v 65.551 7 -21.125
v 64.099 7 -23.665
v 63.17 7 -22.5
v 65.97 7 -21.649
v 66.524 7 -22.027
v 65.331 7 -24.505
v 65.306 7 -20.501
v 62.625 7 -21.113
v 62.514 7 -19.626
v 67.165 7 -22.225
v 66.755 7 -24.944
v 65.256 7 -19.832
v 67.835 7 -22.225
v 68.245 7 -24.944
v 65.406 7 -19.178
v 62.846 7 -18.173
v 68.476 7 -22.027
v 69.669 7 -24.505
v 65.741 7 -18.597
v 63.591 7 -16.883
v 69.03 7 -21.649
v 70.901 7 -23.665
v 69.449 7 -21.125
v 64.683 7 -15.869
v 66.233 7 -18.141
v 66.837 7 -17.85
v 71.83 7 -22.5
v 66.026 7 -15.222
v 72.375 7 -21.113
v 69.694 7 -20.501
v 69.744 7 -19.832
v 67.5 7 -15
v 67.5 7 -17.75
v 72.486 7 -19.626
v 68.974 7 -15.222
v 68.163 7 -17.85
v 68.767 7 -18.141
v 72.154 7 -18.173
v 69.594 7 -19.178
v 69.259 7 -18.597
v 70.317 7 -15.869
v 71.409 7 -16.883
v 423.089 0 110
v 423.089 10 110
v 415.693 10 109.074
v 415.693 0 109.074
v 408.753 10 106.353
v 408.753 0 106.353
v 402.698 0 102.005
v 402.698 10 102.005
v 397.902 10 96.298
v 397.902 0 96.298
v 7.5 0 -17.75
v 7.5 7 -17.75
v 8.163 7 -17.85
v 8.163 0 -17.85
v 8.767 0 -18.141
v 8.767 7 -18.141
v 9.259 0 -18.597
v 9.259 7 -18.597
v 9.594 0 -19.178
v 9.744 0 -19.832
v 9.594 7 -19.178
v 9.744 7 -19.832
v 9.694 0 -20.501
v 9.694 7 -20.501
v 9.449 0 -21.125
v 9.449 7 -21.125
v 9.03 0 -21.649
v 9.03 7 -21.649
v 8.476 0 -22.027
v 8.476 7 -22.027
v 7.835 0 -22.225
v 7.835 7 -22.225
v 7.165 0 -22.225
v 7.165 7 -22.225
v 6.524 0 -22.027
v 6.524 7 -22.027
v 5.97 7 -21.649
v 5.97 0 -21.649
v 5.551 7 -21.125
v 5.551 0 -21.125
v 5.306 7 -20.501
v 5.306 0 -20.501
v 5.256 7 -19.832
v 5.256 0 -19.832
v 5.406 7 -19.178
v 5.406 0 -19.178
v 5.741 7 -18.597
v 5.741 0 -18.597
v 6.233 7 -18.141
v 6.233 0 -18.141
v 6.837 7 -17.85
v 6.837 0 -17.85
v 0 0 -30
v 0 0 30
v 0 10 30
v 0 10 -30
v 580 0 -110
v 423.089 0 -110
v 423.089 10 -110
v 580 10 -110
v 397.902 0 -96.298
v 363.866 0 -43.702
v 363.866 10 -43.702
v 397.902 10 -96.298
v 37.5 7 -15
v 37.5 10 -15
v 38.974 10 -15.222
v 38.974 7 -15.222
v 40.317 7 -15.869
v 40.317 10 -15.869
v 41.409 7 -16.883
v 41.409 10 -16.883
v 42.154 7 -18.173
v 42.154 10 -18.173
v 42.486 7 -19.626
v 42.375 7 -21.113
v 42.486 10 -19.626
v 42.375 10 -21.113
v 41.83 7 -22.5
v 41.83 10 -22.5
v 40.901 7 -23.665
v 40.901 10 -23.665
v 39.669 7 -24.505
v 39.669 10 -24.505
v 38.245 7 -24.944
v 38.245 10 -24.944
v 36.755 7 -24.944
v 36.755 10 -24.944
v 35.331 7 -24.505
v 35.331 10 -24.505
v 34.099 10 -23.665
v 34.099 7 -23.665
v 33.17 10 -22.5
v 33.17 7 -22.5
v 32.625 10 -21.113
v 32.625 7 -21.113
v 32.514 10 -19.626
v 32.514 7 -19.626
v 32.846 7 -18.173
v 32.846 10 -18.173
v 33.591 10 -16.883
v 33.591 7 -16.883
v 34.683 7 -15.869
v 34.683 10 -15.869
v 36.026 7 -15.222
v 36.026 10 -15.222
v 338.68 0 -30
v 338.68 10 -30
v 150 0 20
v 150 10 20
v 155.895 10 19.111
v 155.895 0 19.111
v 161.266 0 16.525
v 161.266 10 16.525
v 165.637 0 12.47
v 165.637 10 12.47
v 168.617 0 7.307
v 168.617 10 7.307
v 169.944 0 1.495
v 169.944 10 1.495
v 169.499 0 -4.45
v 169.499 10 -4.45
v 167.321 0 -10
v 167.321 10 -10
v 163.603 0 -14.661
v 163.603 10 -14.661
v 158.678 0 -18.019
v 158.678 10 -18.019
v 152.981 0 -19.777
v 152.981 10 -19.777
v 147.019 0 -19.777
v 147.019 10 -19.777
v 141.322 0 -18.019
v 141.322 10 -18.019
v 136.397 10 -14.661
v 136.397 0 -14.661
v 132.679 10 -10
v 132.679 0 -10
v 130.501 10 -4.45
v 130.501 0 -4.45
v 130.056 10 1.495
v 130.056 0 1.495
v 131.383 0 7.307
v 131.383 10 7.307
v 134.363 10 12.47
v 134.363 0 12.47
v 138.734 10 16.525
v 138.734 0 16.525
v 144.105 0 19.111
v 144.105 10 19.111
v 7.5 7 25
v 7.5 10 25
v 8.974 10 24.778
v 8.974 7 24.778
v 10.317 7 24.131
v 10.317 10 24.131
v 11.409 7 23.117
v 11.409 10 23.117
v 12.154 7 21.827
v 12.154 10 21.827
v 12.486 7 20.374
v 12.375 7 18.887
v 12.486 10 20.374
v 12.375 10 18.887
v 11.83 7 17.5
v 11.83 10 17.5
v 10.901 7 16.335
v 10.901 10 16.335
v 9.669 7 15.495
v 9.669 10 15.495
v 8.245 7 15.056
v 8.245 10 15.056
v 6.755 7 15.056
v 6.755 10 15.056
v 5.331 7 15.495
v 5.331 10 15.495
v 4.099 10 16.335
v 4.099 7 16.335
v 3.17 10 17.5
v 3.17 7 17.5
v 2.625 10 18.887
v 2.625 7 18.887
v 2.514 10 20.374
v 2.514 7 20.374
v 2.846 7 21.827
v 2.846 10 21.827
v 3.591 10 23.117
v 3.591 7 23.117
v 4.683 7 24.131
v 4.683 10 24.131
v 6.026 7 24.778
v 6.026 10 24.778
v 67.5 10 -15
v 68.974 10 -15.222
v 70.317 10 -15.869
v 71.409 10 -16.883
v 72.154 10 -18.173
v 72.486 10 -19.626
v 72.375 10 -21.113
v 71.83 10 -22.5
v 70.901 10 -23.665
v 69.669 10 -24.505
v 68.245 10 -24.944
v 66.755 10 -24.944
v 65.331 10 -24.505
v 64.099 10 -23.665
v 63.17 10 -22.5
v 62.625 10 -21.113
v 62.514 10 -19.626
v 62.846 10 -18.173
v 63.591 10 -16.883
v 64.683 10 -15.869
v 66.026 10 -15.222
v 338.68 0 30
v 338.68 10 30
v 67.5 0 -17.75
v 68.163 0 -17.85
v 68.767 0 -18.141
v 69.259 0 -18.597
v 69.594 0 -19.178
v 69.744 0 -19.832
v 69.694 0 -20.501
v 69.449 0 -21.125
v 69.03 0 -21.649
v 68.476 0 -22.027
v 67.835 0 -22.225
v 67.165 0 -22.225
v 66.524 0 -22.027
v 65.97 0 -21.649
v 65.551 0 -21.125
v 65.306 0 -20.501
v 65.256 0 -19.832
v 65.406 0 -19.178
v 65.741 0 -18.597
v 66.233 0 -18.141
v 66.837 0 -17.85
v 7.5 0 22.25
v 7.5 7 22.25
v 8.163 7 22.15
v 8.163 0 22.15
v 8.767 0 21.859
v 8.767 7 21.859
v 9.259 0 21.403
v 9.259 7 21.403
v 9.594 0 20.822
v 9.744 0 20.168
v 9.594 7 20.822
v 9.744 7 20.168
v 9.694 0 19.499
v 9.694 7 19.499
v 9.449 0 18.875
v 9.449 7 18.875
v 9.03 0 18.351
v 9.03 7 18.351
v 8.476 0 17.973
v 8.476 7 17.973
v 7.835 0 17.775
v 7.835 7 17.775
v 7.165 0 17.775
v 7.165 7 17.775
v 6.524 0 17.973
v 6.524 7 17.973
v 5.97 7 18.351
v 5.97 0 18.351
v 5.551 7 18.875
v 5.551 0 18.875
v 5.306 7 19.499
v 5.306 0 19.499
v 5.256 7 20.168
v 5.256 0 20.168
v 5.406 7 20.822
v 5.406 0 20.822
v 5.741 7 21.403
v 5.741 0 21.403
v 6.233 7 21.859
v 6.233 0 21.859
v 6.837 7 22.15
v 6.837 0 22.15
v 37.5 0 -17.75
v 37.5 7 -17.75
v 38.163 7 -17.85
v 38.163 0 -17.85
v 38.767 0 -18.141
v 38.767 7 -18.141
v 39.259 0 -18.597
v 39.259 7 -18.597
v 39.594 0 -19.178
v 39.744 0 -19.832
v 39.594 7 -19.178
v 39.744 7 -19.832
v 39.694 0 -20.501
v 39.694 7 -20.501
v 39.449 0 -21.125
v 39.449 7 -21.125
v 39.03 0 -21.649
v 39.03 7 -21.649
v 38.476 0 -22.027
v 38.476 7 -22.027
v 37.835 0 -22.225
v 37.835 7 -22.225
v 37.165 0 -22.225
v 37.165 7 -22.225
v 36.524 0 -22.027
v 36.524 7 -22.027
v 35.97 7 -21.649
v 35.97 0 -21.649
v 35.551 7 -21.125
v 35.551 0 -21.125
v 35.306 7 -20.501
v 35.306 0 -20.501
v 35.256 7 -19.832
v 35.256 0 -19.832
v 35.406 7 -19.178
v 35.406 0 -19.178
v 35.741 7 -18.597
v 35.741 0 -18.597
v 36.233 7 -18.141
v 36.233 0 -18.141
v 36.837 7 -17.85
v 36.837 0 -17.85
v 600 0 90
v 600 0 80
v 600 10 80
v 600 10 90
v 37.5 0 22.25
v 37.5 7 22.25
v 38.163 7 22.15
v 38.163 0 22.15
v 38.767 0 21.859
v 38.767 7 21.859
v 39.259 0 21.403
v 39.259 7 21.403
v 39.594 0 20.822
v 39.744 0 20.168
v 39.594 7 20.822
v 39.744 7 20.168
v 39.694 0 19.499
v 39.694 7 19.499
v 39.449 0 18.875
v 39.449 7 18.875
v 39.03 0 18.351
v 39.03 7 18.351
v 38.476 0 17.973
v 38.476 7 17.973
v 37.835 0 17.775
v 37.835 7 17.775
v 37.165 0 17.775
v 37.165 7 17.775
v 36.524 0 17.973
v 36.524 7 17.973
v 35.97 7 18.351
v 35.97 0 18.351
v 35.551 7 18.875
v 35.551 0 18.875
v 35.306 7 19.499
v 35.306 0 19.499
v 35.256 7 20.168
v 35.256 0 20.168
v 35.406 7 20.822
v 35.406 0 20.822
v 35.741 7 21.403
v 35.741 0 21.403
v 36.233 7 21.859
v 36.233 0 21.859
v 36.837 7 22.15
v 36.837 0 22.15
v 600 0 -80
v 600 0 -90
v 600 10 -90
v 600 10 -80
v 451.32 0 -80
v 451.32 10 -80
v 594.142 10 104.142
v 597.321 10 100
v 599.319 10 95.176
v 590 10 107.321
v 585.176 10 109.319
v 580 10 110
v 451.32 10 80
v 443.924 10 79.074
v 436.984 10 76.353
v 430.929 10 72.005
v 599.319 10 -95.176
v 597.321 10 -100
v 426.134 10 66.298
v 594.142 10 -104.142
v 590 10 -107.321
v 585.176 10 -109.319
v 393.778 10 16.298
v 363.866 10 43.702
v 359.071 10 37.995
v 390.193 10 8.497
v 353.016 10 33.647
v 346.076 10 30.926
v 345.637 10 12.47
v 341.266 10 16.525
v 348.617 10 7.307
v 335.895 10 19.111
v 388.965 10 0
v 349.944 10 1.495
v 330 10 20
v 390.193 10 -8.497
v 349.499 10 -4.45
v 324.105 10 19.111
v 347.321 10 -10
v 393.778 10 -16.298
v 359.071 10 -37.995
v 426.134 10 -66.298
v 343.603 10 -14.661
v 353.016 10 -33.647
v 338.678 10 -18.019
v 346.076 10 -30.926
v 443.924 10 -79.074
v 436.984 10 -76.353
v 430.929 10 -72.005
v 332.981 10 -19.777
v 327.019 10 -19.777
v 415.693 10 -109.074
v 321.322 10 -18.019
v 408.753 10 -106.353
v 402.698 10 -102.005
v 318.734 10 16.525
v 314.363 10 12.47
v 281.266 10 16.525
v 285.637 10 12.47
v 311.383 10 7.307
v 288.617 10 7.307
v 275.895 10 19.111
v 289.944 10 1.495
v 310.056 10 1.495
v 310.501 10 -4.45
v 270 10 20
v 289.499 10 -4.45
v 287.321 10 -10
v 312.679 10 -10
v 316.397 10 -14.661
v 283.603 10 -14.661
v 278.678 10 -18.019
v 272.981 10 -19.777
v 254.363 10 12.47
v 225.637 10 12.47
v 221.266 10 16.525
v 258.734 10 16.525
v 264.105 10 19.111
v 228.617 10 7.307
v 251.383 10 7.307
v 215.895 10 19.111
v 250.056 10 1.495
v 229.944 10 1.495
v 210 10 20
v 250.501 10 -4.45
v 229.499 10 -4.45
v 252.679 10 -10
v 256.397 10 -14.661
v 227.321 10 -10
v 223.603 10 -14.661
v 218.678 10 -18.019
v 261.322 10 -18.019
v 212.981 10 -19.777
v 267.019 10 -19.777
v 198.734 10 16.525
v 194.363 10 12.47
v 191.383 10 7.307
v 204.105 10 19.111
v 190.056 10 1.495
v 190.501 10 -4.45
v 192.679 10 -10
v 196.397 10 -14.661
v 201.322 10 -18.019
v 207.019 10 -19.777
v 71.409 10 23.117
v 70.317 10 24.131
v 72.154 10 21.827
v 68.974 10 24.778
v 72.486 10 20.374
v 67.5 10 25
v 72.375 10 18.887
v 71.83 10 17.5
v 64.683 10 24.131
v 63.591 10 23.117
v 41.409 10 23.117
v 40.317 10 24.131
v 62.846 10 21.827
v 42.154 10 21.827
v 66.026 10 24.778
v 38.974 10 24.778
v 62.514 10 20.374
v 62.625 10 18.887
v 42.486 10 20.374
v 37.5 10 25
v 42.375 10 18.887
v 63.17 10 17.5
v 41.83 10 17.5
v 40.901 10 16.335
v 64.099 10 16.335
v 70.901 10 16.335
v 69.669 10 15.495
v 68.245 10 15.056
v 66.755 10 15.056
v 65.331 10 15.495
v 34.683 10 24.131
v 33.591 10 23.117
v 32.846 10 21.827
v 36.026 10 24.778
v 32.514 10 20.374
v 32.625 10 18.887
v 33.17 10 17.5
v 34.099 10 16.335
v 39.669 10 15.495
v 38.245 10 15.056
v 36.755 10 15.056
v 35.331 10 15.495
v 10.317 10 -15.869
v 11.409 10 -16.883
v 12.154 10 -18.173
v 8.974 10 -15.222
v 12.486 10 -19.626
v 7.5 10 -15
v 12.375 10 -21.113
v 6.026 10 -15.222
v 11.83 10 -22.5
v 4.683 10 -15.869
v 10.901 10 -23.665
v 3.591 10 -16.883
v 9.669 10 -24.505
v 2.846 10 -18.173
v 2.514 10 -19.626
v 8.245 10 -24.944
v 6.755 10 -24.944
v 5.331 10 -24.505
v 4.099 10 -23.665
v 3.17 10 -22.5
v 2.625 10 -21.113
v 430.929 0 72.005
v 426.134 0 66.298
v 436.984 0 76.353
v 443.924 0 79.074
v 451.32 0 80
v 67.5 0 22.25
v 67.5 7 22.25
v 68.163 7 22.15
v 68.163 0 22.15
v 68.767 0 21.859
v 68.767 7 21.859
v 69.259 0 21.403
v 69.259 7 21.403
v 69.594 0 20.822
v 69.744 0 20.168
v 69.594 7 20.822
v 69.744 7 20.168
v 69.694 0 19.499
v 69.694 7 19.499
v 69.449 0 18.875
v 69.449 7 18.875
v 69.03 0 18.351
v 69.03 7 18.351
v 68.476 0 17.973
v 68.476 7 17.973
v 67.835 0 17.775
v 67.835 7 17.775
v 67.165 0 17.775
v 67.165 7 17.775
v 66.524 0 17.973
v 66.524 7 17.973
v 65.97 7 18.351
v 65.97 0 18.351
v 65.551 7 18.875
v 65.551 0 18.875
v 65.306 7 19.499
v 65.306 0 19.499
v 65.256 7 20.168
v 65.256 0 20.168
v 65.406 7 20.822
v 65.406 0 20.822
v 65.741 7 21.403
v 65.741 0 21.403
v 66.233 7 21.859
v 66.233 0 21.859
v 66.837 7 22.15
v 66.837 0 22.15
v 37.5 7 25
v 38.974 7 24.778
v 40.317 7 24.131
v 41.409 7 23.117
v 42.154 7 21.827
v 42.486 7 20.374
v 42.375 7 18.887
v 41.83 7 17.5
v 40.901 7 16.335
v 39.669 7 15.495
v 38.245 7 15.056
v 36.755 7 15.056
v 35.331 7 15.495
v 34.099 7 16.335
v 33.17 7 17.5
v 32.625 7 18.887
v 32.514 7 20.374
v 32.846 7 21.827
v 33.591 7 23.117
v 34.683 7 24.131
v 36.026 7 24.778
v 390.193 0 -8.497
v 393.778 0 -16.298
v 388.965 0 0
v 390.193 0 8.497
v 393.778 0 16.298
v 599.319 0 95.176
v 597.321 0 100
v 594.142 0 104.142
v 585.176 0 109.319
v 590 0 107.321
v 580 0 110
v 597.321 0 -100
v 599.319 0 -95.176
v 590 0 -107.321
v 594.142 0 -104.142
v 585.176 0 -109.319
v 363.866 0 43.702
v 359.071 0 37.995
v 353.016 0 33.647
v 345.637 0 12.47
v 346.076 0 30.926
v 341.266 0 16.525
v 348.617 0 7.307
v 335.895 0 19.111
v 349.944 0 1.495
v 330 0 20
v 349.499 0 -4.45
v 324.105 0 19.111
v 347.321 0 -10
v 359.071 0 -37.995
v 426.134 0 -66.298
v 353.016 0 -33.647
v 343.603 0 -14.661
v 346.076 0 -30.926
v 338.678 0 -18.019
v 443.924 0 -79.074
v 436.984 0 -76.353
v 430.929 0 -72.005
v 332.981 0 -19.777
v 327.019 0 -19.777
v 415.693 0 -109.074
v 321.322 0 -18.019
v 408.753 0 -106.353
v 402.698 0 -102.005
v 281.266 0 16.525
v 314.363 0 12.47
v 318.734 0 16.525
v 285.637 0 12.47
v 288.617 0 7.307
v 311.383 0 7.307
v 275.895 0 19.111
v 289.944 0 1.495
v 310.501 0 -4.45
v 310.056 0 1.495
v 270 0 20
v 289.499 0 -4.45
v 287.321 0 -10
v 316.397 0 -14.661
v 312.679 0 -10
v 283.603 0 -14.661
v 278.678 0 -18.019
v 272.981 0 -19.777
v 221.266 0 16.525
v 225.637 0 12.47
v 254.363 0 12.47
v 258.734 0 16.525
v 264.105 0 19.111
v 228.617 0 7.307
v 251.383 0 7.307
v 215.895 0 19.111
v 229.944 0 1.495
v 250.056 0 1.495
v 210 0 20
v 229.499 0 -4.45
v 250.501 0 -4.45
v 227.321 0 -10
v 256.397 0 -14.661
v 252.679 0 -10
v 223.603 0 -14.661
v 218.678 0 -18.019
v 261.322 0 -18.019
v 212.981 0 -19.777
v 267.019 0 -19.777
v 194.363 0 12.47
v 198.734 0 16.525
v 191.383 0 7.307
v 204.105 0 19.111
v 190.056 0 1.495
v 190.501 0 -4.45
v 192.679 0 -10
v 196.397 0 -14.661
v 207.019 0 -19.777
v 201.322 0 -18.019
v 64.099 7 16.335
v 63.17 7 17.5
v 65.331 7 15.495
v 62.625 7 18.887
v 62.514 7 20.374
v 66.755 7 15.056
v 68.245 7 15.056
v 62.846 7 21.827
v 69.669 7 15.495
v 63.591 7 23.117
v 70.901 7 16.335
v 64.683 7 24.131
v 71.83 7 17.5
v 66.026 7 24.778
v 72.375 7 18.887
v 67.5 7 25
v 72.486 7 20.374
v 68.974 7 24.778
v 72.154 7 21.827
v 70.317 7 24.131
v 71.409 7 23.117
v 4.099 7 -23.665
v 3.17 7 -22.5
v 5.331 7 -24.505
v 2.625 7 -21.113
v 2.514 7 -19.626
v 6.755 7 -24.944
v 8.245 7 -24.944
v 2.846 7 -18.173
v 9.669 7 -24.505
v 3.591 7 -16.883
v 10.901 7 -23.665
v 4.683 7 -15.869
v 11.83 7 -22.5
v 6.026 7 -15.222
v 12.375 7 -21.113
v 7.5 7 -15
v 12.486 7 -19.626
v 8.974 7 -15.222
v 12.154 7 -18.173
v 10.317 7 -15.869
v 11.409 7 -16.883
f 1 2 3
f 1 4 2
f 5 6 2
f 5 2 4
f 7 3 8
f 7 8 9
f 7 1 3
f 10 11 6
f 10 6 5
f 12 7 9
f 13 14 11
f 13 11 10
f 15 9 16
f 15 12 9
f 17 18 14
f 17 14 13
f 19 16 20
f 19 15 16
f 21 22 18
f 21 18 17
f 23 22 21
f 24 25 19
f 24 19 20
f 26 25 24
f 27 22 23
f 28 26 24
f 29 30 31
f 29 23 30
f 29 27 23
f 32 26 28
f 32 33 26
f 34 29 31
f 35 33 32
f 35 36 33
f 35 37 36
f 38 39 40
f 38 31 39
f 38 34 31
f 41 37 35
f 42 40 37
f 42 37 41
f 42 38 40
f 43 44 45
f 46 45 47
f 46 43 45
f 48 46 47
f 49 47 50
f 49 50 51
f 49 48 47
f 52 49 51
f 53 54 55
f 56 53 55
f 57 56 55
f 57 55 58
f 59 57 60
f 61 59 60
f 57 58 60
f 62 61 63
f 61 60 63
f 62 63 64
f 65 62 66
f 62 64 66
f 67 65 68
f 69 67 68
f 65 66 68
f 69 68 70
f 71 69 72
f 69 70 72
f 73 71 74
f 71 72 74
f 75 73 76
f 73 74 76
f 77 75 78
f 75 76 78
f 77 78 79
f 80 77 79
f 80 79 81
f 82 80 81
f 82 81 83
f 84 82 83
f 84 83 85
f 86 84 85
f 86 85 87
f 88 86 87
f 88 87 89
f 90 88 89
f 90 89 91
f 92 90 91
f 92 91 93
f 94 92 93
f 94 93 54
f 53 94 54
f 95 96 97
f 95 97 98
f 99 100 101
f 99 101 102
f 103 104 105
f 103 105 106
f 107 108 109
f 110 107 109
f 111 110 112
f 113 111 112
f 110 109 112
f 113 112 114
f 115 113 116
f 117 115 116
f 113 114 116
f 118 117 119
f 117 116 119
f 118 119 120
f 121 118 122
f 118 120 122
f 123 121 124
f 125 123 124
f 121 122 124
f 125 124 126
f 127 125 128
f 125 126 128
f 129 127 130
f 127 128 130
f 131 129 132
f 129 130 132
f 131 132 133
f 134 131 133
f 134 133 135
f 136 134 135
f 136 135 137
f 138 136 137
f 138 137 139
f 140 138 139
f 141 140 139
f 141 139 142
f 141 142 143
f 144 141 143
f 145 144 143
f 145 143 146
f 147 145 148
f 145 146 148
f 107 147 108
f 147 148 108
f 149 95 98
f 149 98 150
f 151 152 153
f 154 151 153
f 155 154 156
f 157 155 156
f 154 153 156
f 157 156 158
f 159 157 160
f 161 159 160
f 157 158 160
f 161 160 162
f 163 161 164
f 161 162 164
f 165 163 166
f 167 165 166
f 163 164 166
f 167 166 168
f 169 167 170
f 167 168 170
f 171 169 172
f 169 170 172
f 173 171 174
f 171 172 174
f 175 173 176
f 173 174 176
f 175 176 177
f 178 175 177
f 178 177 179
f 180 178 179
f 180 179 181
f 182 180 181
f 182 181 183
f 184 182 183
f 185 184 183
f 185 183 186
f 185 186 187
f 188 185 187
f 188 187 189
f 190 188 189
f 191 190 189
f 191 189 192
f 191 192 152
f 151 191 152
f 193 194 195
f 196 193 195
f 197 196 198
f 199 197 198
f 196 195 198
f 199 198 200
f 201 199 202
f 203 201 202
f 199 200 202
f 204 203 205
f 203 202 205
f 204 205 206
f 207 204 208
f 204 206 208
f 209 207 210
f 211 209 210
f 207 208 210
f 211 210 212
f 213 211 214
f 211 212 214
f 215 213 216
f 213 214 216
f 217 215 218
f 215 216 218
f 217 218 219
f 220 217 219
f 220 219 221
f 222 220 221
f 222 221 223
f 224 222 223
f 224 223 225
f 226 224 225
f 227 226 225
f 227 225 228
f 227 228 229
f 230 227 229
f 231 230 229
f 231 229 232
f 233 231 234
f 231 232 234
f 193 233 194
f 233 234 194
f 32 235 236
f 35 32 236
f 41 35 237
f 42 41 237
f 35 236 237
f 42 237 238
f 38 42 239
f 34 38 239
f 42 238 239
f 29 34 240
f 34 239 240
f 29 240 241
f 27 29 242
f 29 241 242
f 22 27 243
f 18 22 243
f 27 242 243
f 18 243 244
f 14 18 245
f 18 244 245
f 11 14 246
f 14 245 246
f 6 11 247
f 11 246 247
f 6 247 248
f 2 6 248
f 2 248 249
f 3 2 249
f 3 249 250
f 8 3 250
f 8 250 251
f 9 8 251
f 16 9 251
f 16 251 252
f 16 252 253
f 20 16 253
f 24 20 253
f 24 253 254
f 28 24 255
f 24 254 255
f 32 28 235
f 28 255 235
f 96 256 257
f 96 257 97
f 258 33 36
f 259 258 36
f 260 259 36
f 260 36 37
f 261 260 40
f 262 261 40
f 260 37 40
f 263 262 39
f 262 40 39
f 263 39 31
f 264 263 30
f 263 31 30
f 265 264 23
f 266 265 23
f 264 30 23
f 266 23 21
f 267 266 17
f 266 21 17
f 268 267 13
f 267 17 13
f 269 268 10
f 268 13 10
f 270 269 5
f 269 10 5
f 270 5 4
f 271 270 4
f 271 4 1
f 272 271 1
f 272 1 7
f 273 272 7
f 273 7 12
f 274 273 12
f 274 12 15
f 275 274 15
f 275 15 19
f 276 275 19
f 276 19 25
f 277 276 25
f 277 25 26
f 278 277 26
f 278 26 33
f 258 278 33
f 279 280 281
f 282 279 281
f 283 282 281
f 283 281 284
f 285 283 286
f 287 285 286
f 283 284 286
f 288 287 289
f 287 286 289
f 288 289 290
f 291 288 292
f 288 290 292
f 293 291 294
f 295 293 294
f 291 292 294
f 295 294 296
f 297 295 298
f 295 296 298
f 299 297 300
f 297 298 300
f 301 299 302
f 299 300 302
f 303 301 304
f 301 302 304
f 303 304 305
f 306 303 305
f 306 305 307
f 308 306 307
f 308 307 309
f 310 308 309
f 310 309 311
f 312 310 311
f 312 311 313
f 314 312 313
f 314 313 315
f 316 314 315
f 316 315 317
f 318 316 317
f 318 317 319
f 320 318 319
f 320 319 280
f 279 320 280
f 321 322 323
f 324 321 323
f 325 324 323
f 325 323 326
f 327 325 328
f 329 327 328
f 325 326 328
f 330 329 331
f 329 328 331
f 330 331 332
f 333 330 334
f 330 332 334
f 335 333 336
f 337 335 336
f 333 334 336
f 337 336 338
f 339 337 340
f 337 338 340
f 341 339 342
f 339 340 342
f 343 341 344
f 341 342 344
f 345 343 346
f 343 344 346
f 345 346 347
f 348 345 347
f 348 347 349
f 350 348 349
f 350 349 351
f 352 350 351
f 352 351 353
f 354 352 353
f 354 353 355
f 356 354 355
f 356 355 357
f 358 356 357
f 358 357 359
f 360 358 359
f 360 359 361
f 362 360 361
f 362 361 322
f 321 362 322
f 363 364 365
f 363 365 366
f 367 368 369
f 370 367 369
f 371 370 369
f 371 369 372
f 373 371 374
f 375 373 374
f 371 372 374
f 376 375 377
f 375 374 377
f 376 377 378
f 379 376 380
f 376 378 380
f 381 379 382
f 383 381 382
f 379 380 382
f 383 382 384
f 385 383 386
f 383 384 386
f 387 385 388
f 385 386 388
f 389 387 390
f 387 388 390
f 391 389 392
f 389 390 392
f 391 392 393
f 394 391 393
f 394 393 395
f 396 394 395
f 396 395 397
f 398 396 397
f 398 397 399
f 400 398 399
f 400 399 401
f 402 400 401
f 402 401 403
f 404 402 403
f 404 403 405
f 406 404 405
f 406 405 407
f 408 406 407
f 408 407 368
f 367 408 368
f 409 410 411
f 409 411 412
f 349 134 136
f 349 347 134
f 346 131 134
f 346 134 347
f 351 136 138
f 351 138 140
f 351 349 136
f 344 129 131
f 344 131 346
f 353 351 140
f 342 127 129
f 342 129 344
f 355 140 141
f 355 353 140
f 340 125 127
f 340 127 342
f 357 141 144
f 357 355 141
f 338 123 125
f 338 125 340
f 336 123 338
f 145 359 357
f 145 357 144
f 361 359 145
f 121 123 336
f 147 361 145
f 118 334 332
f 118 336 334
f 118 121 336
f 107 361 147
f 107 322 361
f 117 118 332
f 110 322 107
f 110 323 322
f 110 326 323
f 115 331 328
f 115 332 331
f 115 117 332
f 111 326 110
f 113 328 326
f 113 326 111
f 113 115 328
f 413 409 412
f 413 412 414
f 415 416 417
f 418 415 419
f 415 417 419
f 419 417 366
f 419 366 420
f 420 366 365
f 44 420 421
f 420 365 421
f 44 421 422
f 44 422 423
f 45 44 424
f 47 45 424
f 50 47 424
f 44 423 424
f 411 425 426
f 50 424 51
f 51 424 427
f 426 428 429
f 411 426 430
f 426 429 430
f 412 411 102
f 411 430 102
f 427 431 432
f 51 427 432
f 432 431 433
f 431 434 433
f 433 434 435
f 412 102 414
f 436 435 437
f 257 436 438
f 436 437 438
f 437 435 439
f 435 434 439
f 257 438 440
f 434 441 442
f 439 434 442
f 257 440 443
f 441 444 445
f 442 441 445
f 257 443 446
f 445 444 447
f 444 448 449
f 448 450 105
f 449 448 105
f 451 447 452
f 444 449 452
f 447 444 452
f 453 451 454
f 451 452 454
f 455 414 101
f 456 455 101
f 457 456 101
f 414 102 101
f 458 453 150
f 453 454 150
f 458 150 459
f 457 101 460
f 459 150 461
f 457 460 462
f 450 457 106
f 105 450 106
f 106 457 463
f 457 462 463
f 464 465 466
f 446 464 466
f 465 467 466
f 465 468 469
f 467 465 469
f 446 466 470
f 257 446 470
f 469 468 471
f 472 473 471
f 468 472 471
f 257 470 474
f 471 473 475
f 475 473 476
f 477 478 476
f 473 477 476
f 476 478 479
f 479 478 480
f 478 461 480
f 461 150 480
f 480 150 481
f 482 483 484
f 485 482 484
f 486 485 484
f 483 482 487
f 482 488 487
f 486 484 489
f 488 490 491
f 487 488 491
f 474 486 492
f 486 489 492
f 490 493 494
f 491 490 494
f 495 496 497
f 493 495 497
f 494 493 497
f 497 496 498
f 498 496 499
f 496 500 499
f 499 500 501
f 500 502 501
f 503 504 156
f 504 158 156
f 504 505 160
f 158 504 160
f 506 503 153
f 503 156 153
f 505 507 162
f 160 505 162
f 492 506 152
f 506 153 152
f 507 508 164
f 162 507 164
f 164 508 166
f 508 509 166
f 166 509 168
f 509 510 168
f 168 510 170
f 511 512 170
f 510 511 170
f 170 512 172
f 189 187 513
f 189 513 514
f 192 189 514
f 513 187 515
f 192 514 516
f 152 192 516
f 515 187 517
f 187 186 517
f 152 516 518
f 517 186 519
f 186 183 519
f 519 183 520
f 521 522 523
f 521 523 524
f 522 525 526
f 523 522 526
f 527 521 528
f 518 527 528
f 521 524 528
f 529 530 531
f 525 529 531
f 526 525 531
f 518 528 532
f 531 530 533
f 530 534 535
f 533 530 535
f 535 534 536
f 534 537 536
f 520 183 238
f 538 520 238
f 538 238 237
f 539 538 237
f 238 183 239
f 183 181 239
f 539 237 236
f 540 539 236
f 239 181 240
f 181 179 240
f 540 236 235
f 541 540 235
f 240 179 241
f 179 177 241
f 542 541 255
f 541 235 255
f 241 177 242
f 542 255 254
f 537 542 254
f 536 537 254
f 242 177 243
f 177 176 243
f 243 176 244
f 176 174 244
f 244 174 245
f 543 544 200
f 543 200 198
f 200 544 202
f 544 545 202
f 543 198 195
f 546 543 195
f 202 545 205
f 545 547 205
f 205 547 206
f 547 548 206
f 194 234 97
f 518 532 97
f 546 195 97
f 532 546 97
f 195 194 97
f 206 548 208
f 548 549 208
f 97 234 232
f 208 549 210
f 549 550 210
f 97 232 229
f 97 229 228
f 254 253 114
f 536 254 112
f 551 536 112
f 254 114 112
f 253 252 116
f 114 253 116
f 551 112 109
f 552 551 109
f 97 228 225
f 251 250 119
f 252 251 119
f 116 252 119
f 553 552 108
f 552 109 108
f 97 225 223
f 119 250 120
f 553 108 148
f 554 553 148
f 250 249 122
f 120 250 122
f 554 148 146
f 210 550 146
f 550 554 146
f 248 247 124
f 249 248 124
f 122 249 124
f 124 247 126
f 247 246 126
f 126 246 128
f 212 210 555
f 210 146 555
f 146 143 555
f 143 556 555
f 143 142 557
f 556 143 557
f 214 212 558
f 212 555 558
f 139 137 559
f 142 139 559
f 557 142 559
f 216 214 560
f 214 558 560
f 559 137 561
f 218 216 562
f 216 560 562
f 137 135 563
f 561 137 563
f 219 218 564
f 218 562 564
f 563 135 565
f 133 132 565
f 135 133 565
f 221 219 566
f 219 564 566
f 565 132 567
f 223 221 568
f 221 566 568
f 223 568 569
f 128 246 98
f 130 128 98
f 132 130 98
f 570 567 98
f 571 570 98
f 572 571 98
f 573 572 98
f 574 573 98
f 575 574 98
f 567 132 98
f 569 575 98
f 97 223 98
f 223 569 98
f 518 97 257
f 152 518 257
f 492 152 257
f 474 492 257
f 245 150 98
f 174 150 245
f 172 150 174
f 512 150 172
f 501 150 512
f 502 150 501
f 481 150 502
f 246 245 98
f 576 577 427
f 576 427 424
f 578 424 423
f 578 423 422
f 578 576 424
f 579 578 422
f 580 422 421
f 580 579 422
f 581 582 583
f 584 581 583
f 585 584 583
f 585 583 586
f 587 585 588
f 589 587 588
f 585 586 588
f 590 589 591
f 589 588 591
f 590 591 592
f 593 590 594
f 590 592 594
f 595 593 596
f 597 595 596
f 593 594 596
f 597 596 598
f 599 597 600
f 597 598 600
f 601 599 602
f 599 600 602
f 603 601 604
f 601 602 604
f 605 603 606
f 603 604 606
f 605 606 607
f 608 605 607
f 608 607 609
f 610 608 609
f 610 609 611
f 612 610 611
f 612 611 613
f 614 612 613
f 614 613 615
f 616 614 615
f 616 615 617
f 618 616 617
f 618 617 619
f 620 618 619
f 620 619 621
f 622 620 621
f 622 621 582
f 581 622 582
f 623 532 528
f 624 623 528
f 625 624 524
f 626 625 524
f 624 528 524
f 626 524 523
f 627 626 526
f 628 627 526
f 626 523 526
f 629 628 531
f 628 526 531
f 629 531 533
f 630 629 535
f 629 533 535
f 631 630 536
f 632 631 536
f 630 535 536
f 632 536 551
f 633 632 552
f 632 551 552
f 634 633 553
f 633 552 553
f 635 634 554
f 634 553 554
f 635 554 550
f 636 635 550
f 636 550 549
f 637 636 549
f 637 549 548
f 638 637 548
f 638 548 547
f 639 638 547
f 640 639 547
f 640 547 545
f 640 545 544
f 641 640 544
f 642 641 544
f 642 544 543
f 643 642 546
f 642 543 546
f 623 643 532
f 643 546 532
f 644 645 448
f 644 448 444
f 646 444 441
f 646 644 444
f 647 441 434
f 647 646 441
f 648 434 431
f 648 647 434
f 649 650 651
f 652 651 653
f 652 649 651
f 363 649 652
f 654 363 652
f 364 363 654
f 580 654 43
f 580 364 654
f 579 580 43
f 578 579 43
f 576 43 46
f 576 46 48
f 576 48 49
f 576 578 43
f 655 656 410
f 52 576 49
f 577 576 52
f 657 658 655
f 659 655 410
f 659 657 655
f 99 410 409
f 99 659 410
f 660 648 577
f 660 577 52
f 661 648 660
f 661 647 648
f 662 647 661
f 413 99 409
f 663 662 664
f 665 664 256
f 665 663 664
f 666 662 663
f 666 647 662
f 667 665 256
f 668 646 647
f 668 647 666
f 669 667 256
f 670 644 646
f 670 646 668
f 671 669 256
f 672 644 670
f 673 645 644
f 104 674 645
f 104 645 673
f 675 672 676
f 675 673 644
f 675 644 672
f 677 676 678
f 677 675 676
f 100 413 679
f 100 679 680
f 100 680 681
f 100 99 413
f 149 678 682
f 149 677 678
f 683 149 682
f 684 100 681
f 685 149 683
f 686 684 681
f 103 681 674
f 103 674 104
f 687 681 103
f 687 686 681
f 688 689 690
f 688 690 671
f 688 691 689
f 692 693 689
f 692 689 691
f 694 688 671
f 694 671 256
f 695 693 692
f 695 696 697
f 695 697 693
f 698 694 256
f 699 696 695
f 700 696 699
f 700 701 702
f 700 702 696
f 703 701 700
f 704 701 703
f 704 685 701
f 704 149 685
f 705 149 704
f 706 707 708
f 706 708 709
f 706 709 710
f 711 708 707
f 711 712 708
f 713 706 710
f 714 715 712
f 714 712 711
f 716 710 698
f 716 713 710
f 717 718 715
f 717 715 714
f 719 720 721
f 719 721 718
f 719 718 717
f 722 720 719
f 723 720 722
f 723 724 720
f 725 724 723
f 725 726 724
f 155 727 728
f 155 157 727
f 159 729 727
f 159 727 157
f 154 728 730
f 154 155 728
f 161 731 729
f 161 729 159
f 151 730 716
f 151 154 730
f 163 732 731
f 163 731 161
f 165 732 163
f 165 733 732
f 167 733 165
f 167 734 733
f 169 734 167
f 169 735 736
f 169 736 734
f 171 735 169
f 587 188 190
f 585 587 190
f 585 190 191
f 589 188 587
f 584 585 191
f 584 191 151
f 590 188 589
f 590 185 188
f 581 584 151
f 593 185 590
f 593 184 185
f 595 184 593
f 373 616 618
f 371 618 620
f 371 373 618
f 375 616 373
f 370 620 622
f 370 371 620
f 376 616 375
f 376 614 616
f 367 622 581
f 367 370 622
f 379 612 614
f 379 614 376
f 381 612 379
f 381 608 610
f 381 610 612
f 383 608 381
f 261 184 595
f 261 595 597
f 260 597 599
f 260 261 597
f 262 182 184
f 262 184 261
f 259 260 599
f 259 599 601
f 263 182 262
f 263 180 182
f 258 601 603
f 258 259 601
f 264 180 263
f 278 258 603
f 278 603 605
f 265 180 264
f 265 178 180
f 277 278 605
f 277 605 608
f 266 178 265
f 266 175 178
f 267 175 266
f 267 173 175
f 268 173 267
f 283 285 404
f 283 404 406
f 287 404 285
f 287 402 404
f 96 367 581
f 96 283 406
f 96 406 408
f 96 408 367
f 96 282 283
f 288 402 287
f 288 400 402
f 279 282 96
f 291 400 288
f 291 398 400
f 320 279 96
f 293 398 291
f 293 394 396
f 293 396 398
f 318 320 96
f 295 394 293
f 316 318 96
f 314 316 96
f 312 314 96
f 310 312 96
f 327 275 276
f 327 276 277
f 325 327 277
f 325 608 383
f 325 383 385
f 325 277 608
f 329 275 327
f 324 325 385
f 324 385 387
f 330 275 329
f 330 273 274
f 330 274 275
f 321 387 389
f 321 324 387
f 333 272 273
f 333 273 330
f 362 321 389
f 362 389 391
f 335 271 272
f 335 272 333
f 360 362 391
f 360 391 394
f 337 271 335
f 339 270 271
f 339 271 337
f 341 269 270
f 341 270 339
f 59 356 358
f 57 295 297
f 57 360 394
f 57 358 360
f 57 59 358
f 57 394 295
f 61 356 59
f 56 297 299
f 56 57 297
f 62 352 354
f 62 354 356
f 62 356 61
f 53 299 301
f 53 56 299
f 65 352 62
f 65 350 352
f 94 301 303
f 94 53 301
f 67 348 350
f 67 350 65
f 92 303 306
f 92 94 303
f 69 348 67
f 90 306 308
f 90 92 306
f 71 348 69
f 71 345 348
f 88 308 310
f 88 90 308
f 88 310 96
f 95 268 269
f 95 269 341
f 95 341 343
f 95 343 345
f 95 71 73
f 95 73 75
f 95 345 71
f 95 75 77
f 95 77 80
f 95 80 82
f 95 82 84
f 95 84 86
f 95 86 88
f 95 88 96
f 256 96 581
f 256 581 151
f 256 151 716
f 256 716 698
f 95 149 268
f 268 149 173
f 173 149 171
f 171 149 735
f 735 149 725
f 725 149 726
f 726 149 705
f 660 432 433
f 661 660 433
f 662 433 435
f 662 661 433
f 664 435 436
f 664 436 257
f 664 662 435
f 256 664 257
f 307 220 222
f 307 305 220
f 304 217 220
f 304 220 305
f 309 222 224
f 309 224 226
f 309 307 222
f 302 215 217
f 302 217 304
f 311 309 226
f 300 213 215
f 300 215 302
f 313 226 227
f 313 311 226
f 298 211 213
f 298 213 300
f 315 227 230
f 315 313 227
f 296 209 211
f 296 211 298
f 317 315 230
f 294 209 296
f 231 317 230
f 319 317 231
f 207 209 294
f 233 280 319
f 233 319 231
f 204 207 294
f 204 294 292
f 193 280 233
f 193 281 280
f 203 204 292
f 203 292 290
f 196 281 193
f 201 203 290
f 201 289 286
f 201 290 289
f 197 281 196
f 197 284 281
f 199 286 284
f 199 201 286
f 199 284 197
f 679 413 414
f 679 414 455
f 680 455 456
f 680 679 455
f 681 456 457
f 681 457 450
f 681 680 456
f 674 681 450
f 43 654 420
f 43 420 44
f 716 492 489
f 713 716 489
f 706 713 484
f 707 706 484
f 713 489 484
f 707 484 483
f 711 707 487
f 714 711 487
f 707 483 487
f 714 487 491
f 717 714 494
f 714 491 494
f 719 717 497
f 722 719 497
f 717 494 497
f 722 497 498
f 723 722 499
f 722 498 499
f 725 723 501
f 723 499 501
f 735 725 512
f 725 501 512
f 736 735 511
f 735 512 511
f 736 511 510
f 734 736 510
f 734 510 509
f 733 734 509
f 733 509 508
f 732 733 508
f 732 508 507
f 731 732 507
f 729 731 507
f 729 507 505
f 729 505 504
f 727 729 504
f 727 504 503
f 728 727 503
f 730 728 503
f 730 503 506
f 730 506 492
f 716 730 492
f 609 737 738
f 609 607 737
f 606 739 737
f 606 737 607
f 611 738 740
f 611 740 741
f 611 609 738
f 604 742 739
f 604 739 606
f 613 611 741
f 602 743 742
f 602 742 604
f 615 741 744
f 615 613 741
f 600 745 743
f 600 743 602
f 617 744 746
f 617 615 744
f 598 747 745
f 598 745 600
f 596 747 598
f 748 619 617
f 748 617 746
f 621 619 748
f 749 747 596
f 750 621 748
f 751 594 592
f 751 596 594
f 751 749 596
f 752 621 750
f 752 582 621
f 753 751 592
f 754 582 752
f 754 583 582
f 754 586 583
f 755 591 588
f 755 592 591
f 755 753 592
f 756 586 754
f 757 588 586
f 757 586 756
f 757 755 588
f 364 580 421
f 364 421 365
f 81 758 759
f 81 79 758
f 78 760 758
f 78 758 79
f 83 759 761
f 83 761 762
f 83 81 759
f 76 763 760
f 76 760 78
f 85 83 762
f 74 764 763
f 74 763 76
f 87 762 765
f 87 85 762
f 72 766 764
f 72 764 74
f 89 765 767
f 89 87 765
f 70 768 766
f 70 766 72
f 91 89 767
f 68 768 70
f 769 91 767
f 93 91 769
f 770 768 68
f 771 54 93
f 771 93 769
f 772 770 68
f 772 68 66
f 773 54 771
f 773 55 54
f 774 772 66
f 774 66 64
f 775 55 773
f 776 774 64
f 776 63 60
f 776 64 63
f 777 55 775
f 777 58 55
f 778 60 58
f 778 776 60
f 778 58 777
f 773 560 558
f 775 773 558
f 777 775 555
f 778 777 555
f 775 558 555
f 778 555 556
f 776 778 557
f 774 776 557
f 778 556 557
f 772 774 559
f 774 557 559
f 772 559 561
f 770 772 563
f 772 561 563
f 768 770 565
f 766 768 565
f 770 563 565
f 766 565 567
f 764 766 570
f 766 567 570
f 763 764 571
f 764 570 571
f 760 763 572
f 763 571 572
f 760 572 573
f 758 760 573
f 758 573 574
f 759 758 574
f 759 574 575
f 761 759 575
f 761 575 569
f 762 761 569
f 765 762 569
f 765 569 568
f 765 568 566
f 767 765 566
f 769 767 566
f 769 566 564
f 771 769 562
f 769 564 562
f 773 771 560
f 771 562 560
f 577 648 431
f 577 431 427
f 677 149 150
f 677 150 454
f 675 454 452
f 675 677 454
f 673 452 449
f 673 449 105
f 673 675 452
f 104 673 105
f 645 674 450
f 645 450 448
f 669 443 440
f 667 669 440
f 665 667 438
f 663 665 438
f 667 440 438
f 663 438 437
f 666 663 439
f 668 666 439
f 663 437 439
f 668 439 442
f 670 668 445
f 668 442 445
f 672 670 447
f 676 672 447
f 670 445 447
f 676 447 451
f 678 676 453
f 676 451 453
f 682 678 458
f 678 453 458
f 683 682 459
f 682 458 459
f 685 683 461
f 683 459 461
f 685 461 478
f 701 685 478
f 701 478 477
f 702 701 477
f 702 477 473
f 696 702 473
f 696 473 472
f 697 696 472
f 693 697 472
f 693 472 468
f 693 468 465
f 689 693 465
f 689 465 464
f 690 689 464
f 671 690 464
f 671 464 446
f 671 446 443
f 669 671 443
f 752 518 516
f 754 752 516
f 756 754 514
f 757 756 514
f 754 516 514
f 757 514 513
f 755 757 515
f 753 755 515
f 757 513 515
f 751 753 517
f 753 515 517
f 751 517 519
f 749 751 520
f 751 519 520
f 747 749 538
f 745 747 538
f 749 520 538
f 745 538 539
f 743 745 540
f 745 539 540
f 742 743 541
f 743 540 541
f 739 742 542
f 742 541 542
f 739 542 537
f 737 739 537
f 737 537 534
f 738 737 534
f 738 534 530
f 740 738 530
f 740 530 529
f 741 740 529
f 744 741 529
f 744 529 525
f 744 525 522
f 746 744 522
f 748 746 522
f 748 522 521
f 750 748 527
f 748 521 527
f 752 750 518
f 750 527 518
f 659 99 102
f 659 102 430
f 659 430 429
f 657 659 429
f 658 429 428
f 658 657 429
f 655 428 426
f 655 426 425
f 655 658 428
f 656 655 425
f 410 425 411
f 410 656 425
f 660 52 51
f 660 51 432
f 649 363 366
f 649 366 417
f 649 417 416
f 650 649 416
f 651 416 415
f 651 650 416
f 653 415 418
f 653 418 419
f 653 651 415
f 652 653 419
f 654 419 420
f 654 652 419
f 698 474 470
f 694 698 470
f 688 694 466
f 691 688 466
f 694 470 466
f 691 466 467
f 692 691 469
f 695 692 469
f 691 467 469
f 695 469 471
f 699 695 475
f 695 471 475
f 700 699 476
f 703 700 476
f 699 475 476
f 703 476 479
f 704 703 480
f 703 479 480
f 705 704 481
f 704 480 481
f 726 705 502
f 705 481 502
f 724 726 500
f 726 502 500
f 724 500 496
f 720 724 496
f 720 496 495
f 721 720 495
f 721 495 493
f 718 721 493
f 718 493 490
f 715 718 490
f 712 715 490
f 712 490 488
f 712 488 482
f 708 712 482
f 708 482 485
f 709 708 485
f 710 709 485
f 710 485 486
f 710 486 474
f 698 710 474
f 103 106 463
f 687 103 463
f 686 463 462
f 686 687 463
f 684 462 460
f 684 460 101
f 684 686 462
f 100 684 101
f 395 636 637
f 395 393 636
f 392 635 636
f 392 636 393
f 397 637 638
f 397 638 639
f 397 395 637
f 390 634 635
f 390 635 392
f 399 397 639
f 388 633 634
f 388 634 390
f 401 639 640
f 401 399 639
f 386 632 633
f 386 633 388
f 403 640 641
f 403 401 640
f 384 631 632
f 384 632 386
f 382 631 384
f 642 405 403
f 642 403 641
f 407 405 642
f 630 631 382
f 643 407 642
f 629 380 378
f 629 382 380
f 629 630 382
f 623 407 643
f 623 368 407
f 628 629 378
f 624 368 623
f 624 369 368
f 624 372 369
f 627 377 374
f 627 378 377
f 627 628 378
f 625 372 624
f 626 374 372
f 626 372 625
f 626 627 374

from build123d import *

# Parameters (mm, degrees)
EXTRUDE_1_DEPTH     = 10
SKETCH_3_R          = 20
CUT_EXTRUDE_1_DEPTH = 611.081961707
SKETCH_4_R          = 5
CUT_EXTRUDE_2_DEPTH = 3
SKETCH_5_R          = 2.25
CUT_EXTRUDE_3_DEPTH = 611.040162612


with BuildPart() as part:
    # 스케치1 → 보스-돌출1 (new body)
    with BuildSketch(Plane(origin=(0, 0, 0), x_dir=(1, 0, 0), z_dir=(0, 1, 0))):
        with BuildLine():
            Line((363.866410807, 43.701562934), (397.902344915, 96.298437066))
            ThreePointArc((397.902344915, 96.298437066), (408.752779214, 106.352923101), (423.088868082, 110))
            Line((423.088868082, 110), (580, 110))
            ThreePointArc((580, 110), (594.142135624, 104.142135624), (600, 90))
            Line((600, 90), (600, 80))
            Line((600, 80), (451.32011236, 80))
            ThreePointArc((451.32011236, 80), (436.984023492, 76.352923101), (426.133589193, 66.298437066))
            Line((426.133589193, 66.298437066), (393.778116867, 16.298437066))
            ThreePointArc((393.778116867, 16.298437066), (388.964640033, 0), (393.778116867, -16.298437066))
            Line((393.778116867, -16.298437066), (426.133589193, -66.298437066))
            ThreePointArc((426.133589193, -66.298437066), (436.984023492, -76.352923101), (451.32011236, -80))
            Line((451.32011236, -80), (600, -80))
            Line((600, -80), (600, -90))
            ThreePointArc((600, -90), (594.142135624, -104.142135624), (580, -110))
            Line((580, -110), (423.088868082, -110))
            ThreePointArc((423.088868082, -110), (408.752779214, -106.352923101), (397.902344915, -96.298437066))
            Line((397.902344915, -96.298437066), (363.866410807, -43.701562934))
            ThreePointArc((363.866410807, -43.701562934), (353.015976508, -33.647076899), (338.67988764, -30))
            Line((338.67988764, -30), (0, -30))
            Line((0, -30), (0, 30))
            Line((0, 30), (338.67988764, 30))
            ThreePointArc((338.67988764, 30), (353.015976508, 33.647076899), (363.866410807, 43.701562934))
        make_face()
    extrude(amount=EXTRUDE_1_DEPTH)

    # 스케치3 → 컷-돌출1 (cut, through all)
    with BuildSketch(Plane(origin=(0, 10, 0), x_dir=(1, 0, 0), z_dir=(0, 1, 0))):
        with Locations(Location((150, 0, 0), (0, 0, 270))):
            Circle(SKETCH_3_R)
        with Locations(Location((210, 0, 0), (0, 0, 270))):
            Circle(SKETCH_3_R)
        with Locations(Location((270, 0, 0), (0, 0, 270))):
            Circle(SKETCH_3_R)
        with Locations(Location((330, 0, 0), (0, 0, 270))):
            Circle(SKETCH_3_R)
    extrude(amount=-CUT_EXTRUDE_1_DEPTH, mode=Mode.SUBTRACT)

    # 스케치4 → 컷-돌출2 (cut)
    with BuildSketch(Plane(origin=(0, 10, 0), x_dir=(1, 0, 0), z_dir=(0, 1, 0))):
        with Locations(Location((7.5, 20, 0), (0, 0, 270))):
            Circle(SKETCH_4_R)
        with Locations(Location((37.5, 20, 0), (0, 0, 270))):
            Circle(SKETCH_4_R)
        with Locations(Location((67.5, 20, 0), (0, 0, 270))):
            Circle(SKETCH_4_R)
        with Locations(Location((7.5, -20, 0), (0, 0, 270))):
            Circle(SKETCH_4_R)
        with Locations(Location((37.5, -20, 0), (0, 0, 270))):
            Circle(SKETCH_4_R)
        with Locations(Location((67.5, -20, 0), (0, 0, 270))):
            Circle(SKETCH_4_R)
    extrude(amount=-CUT_EXTRUDE_2_DEPTH, mode=Mode.SUBTRACT)

    # 스케치5 → 컷-돌출3 (cut, through all)
    with BuildSketch(Plane(origin=(0, 7, 0), x_dir=(1, 0, 0), z_dir=(0, 1, 0))):
        with Locations(Location((37.5, 20, 0), (0, 0, 270))):
            Circle(SKETCH_5_R)
        with Locations(Location((67.5, 20, 0), (0, 0, 270))):
            Circle(SKETCH_5_R)
        with Locations(Location((67.5, -20, 0), (0, 0, 270))):
            Circle(SKETCH_5_R)
        with Locations(Location((37.5, -20, 0), (0, 0, 270))):
            Circle(SKETCH_5_R)
        with Locations(Location((7.5, -20, 0), (0, 0, 270))):
            Circle(SKETCH_5_R)
        with Locations(Location((7.5, 20, 0), (0, 0, 270))):
            Circle(SKETCH_5_R)
    extrude(amount=-CUT_EXTRUDE_3_DEPTH, mode=Mode.SUBTRACT)


solid = part.part
